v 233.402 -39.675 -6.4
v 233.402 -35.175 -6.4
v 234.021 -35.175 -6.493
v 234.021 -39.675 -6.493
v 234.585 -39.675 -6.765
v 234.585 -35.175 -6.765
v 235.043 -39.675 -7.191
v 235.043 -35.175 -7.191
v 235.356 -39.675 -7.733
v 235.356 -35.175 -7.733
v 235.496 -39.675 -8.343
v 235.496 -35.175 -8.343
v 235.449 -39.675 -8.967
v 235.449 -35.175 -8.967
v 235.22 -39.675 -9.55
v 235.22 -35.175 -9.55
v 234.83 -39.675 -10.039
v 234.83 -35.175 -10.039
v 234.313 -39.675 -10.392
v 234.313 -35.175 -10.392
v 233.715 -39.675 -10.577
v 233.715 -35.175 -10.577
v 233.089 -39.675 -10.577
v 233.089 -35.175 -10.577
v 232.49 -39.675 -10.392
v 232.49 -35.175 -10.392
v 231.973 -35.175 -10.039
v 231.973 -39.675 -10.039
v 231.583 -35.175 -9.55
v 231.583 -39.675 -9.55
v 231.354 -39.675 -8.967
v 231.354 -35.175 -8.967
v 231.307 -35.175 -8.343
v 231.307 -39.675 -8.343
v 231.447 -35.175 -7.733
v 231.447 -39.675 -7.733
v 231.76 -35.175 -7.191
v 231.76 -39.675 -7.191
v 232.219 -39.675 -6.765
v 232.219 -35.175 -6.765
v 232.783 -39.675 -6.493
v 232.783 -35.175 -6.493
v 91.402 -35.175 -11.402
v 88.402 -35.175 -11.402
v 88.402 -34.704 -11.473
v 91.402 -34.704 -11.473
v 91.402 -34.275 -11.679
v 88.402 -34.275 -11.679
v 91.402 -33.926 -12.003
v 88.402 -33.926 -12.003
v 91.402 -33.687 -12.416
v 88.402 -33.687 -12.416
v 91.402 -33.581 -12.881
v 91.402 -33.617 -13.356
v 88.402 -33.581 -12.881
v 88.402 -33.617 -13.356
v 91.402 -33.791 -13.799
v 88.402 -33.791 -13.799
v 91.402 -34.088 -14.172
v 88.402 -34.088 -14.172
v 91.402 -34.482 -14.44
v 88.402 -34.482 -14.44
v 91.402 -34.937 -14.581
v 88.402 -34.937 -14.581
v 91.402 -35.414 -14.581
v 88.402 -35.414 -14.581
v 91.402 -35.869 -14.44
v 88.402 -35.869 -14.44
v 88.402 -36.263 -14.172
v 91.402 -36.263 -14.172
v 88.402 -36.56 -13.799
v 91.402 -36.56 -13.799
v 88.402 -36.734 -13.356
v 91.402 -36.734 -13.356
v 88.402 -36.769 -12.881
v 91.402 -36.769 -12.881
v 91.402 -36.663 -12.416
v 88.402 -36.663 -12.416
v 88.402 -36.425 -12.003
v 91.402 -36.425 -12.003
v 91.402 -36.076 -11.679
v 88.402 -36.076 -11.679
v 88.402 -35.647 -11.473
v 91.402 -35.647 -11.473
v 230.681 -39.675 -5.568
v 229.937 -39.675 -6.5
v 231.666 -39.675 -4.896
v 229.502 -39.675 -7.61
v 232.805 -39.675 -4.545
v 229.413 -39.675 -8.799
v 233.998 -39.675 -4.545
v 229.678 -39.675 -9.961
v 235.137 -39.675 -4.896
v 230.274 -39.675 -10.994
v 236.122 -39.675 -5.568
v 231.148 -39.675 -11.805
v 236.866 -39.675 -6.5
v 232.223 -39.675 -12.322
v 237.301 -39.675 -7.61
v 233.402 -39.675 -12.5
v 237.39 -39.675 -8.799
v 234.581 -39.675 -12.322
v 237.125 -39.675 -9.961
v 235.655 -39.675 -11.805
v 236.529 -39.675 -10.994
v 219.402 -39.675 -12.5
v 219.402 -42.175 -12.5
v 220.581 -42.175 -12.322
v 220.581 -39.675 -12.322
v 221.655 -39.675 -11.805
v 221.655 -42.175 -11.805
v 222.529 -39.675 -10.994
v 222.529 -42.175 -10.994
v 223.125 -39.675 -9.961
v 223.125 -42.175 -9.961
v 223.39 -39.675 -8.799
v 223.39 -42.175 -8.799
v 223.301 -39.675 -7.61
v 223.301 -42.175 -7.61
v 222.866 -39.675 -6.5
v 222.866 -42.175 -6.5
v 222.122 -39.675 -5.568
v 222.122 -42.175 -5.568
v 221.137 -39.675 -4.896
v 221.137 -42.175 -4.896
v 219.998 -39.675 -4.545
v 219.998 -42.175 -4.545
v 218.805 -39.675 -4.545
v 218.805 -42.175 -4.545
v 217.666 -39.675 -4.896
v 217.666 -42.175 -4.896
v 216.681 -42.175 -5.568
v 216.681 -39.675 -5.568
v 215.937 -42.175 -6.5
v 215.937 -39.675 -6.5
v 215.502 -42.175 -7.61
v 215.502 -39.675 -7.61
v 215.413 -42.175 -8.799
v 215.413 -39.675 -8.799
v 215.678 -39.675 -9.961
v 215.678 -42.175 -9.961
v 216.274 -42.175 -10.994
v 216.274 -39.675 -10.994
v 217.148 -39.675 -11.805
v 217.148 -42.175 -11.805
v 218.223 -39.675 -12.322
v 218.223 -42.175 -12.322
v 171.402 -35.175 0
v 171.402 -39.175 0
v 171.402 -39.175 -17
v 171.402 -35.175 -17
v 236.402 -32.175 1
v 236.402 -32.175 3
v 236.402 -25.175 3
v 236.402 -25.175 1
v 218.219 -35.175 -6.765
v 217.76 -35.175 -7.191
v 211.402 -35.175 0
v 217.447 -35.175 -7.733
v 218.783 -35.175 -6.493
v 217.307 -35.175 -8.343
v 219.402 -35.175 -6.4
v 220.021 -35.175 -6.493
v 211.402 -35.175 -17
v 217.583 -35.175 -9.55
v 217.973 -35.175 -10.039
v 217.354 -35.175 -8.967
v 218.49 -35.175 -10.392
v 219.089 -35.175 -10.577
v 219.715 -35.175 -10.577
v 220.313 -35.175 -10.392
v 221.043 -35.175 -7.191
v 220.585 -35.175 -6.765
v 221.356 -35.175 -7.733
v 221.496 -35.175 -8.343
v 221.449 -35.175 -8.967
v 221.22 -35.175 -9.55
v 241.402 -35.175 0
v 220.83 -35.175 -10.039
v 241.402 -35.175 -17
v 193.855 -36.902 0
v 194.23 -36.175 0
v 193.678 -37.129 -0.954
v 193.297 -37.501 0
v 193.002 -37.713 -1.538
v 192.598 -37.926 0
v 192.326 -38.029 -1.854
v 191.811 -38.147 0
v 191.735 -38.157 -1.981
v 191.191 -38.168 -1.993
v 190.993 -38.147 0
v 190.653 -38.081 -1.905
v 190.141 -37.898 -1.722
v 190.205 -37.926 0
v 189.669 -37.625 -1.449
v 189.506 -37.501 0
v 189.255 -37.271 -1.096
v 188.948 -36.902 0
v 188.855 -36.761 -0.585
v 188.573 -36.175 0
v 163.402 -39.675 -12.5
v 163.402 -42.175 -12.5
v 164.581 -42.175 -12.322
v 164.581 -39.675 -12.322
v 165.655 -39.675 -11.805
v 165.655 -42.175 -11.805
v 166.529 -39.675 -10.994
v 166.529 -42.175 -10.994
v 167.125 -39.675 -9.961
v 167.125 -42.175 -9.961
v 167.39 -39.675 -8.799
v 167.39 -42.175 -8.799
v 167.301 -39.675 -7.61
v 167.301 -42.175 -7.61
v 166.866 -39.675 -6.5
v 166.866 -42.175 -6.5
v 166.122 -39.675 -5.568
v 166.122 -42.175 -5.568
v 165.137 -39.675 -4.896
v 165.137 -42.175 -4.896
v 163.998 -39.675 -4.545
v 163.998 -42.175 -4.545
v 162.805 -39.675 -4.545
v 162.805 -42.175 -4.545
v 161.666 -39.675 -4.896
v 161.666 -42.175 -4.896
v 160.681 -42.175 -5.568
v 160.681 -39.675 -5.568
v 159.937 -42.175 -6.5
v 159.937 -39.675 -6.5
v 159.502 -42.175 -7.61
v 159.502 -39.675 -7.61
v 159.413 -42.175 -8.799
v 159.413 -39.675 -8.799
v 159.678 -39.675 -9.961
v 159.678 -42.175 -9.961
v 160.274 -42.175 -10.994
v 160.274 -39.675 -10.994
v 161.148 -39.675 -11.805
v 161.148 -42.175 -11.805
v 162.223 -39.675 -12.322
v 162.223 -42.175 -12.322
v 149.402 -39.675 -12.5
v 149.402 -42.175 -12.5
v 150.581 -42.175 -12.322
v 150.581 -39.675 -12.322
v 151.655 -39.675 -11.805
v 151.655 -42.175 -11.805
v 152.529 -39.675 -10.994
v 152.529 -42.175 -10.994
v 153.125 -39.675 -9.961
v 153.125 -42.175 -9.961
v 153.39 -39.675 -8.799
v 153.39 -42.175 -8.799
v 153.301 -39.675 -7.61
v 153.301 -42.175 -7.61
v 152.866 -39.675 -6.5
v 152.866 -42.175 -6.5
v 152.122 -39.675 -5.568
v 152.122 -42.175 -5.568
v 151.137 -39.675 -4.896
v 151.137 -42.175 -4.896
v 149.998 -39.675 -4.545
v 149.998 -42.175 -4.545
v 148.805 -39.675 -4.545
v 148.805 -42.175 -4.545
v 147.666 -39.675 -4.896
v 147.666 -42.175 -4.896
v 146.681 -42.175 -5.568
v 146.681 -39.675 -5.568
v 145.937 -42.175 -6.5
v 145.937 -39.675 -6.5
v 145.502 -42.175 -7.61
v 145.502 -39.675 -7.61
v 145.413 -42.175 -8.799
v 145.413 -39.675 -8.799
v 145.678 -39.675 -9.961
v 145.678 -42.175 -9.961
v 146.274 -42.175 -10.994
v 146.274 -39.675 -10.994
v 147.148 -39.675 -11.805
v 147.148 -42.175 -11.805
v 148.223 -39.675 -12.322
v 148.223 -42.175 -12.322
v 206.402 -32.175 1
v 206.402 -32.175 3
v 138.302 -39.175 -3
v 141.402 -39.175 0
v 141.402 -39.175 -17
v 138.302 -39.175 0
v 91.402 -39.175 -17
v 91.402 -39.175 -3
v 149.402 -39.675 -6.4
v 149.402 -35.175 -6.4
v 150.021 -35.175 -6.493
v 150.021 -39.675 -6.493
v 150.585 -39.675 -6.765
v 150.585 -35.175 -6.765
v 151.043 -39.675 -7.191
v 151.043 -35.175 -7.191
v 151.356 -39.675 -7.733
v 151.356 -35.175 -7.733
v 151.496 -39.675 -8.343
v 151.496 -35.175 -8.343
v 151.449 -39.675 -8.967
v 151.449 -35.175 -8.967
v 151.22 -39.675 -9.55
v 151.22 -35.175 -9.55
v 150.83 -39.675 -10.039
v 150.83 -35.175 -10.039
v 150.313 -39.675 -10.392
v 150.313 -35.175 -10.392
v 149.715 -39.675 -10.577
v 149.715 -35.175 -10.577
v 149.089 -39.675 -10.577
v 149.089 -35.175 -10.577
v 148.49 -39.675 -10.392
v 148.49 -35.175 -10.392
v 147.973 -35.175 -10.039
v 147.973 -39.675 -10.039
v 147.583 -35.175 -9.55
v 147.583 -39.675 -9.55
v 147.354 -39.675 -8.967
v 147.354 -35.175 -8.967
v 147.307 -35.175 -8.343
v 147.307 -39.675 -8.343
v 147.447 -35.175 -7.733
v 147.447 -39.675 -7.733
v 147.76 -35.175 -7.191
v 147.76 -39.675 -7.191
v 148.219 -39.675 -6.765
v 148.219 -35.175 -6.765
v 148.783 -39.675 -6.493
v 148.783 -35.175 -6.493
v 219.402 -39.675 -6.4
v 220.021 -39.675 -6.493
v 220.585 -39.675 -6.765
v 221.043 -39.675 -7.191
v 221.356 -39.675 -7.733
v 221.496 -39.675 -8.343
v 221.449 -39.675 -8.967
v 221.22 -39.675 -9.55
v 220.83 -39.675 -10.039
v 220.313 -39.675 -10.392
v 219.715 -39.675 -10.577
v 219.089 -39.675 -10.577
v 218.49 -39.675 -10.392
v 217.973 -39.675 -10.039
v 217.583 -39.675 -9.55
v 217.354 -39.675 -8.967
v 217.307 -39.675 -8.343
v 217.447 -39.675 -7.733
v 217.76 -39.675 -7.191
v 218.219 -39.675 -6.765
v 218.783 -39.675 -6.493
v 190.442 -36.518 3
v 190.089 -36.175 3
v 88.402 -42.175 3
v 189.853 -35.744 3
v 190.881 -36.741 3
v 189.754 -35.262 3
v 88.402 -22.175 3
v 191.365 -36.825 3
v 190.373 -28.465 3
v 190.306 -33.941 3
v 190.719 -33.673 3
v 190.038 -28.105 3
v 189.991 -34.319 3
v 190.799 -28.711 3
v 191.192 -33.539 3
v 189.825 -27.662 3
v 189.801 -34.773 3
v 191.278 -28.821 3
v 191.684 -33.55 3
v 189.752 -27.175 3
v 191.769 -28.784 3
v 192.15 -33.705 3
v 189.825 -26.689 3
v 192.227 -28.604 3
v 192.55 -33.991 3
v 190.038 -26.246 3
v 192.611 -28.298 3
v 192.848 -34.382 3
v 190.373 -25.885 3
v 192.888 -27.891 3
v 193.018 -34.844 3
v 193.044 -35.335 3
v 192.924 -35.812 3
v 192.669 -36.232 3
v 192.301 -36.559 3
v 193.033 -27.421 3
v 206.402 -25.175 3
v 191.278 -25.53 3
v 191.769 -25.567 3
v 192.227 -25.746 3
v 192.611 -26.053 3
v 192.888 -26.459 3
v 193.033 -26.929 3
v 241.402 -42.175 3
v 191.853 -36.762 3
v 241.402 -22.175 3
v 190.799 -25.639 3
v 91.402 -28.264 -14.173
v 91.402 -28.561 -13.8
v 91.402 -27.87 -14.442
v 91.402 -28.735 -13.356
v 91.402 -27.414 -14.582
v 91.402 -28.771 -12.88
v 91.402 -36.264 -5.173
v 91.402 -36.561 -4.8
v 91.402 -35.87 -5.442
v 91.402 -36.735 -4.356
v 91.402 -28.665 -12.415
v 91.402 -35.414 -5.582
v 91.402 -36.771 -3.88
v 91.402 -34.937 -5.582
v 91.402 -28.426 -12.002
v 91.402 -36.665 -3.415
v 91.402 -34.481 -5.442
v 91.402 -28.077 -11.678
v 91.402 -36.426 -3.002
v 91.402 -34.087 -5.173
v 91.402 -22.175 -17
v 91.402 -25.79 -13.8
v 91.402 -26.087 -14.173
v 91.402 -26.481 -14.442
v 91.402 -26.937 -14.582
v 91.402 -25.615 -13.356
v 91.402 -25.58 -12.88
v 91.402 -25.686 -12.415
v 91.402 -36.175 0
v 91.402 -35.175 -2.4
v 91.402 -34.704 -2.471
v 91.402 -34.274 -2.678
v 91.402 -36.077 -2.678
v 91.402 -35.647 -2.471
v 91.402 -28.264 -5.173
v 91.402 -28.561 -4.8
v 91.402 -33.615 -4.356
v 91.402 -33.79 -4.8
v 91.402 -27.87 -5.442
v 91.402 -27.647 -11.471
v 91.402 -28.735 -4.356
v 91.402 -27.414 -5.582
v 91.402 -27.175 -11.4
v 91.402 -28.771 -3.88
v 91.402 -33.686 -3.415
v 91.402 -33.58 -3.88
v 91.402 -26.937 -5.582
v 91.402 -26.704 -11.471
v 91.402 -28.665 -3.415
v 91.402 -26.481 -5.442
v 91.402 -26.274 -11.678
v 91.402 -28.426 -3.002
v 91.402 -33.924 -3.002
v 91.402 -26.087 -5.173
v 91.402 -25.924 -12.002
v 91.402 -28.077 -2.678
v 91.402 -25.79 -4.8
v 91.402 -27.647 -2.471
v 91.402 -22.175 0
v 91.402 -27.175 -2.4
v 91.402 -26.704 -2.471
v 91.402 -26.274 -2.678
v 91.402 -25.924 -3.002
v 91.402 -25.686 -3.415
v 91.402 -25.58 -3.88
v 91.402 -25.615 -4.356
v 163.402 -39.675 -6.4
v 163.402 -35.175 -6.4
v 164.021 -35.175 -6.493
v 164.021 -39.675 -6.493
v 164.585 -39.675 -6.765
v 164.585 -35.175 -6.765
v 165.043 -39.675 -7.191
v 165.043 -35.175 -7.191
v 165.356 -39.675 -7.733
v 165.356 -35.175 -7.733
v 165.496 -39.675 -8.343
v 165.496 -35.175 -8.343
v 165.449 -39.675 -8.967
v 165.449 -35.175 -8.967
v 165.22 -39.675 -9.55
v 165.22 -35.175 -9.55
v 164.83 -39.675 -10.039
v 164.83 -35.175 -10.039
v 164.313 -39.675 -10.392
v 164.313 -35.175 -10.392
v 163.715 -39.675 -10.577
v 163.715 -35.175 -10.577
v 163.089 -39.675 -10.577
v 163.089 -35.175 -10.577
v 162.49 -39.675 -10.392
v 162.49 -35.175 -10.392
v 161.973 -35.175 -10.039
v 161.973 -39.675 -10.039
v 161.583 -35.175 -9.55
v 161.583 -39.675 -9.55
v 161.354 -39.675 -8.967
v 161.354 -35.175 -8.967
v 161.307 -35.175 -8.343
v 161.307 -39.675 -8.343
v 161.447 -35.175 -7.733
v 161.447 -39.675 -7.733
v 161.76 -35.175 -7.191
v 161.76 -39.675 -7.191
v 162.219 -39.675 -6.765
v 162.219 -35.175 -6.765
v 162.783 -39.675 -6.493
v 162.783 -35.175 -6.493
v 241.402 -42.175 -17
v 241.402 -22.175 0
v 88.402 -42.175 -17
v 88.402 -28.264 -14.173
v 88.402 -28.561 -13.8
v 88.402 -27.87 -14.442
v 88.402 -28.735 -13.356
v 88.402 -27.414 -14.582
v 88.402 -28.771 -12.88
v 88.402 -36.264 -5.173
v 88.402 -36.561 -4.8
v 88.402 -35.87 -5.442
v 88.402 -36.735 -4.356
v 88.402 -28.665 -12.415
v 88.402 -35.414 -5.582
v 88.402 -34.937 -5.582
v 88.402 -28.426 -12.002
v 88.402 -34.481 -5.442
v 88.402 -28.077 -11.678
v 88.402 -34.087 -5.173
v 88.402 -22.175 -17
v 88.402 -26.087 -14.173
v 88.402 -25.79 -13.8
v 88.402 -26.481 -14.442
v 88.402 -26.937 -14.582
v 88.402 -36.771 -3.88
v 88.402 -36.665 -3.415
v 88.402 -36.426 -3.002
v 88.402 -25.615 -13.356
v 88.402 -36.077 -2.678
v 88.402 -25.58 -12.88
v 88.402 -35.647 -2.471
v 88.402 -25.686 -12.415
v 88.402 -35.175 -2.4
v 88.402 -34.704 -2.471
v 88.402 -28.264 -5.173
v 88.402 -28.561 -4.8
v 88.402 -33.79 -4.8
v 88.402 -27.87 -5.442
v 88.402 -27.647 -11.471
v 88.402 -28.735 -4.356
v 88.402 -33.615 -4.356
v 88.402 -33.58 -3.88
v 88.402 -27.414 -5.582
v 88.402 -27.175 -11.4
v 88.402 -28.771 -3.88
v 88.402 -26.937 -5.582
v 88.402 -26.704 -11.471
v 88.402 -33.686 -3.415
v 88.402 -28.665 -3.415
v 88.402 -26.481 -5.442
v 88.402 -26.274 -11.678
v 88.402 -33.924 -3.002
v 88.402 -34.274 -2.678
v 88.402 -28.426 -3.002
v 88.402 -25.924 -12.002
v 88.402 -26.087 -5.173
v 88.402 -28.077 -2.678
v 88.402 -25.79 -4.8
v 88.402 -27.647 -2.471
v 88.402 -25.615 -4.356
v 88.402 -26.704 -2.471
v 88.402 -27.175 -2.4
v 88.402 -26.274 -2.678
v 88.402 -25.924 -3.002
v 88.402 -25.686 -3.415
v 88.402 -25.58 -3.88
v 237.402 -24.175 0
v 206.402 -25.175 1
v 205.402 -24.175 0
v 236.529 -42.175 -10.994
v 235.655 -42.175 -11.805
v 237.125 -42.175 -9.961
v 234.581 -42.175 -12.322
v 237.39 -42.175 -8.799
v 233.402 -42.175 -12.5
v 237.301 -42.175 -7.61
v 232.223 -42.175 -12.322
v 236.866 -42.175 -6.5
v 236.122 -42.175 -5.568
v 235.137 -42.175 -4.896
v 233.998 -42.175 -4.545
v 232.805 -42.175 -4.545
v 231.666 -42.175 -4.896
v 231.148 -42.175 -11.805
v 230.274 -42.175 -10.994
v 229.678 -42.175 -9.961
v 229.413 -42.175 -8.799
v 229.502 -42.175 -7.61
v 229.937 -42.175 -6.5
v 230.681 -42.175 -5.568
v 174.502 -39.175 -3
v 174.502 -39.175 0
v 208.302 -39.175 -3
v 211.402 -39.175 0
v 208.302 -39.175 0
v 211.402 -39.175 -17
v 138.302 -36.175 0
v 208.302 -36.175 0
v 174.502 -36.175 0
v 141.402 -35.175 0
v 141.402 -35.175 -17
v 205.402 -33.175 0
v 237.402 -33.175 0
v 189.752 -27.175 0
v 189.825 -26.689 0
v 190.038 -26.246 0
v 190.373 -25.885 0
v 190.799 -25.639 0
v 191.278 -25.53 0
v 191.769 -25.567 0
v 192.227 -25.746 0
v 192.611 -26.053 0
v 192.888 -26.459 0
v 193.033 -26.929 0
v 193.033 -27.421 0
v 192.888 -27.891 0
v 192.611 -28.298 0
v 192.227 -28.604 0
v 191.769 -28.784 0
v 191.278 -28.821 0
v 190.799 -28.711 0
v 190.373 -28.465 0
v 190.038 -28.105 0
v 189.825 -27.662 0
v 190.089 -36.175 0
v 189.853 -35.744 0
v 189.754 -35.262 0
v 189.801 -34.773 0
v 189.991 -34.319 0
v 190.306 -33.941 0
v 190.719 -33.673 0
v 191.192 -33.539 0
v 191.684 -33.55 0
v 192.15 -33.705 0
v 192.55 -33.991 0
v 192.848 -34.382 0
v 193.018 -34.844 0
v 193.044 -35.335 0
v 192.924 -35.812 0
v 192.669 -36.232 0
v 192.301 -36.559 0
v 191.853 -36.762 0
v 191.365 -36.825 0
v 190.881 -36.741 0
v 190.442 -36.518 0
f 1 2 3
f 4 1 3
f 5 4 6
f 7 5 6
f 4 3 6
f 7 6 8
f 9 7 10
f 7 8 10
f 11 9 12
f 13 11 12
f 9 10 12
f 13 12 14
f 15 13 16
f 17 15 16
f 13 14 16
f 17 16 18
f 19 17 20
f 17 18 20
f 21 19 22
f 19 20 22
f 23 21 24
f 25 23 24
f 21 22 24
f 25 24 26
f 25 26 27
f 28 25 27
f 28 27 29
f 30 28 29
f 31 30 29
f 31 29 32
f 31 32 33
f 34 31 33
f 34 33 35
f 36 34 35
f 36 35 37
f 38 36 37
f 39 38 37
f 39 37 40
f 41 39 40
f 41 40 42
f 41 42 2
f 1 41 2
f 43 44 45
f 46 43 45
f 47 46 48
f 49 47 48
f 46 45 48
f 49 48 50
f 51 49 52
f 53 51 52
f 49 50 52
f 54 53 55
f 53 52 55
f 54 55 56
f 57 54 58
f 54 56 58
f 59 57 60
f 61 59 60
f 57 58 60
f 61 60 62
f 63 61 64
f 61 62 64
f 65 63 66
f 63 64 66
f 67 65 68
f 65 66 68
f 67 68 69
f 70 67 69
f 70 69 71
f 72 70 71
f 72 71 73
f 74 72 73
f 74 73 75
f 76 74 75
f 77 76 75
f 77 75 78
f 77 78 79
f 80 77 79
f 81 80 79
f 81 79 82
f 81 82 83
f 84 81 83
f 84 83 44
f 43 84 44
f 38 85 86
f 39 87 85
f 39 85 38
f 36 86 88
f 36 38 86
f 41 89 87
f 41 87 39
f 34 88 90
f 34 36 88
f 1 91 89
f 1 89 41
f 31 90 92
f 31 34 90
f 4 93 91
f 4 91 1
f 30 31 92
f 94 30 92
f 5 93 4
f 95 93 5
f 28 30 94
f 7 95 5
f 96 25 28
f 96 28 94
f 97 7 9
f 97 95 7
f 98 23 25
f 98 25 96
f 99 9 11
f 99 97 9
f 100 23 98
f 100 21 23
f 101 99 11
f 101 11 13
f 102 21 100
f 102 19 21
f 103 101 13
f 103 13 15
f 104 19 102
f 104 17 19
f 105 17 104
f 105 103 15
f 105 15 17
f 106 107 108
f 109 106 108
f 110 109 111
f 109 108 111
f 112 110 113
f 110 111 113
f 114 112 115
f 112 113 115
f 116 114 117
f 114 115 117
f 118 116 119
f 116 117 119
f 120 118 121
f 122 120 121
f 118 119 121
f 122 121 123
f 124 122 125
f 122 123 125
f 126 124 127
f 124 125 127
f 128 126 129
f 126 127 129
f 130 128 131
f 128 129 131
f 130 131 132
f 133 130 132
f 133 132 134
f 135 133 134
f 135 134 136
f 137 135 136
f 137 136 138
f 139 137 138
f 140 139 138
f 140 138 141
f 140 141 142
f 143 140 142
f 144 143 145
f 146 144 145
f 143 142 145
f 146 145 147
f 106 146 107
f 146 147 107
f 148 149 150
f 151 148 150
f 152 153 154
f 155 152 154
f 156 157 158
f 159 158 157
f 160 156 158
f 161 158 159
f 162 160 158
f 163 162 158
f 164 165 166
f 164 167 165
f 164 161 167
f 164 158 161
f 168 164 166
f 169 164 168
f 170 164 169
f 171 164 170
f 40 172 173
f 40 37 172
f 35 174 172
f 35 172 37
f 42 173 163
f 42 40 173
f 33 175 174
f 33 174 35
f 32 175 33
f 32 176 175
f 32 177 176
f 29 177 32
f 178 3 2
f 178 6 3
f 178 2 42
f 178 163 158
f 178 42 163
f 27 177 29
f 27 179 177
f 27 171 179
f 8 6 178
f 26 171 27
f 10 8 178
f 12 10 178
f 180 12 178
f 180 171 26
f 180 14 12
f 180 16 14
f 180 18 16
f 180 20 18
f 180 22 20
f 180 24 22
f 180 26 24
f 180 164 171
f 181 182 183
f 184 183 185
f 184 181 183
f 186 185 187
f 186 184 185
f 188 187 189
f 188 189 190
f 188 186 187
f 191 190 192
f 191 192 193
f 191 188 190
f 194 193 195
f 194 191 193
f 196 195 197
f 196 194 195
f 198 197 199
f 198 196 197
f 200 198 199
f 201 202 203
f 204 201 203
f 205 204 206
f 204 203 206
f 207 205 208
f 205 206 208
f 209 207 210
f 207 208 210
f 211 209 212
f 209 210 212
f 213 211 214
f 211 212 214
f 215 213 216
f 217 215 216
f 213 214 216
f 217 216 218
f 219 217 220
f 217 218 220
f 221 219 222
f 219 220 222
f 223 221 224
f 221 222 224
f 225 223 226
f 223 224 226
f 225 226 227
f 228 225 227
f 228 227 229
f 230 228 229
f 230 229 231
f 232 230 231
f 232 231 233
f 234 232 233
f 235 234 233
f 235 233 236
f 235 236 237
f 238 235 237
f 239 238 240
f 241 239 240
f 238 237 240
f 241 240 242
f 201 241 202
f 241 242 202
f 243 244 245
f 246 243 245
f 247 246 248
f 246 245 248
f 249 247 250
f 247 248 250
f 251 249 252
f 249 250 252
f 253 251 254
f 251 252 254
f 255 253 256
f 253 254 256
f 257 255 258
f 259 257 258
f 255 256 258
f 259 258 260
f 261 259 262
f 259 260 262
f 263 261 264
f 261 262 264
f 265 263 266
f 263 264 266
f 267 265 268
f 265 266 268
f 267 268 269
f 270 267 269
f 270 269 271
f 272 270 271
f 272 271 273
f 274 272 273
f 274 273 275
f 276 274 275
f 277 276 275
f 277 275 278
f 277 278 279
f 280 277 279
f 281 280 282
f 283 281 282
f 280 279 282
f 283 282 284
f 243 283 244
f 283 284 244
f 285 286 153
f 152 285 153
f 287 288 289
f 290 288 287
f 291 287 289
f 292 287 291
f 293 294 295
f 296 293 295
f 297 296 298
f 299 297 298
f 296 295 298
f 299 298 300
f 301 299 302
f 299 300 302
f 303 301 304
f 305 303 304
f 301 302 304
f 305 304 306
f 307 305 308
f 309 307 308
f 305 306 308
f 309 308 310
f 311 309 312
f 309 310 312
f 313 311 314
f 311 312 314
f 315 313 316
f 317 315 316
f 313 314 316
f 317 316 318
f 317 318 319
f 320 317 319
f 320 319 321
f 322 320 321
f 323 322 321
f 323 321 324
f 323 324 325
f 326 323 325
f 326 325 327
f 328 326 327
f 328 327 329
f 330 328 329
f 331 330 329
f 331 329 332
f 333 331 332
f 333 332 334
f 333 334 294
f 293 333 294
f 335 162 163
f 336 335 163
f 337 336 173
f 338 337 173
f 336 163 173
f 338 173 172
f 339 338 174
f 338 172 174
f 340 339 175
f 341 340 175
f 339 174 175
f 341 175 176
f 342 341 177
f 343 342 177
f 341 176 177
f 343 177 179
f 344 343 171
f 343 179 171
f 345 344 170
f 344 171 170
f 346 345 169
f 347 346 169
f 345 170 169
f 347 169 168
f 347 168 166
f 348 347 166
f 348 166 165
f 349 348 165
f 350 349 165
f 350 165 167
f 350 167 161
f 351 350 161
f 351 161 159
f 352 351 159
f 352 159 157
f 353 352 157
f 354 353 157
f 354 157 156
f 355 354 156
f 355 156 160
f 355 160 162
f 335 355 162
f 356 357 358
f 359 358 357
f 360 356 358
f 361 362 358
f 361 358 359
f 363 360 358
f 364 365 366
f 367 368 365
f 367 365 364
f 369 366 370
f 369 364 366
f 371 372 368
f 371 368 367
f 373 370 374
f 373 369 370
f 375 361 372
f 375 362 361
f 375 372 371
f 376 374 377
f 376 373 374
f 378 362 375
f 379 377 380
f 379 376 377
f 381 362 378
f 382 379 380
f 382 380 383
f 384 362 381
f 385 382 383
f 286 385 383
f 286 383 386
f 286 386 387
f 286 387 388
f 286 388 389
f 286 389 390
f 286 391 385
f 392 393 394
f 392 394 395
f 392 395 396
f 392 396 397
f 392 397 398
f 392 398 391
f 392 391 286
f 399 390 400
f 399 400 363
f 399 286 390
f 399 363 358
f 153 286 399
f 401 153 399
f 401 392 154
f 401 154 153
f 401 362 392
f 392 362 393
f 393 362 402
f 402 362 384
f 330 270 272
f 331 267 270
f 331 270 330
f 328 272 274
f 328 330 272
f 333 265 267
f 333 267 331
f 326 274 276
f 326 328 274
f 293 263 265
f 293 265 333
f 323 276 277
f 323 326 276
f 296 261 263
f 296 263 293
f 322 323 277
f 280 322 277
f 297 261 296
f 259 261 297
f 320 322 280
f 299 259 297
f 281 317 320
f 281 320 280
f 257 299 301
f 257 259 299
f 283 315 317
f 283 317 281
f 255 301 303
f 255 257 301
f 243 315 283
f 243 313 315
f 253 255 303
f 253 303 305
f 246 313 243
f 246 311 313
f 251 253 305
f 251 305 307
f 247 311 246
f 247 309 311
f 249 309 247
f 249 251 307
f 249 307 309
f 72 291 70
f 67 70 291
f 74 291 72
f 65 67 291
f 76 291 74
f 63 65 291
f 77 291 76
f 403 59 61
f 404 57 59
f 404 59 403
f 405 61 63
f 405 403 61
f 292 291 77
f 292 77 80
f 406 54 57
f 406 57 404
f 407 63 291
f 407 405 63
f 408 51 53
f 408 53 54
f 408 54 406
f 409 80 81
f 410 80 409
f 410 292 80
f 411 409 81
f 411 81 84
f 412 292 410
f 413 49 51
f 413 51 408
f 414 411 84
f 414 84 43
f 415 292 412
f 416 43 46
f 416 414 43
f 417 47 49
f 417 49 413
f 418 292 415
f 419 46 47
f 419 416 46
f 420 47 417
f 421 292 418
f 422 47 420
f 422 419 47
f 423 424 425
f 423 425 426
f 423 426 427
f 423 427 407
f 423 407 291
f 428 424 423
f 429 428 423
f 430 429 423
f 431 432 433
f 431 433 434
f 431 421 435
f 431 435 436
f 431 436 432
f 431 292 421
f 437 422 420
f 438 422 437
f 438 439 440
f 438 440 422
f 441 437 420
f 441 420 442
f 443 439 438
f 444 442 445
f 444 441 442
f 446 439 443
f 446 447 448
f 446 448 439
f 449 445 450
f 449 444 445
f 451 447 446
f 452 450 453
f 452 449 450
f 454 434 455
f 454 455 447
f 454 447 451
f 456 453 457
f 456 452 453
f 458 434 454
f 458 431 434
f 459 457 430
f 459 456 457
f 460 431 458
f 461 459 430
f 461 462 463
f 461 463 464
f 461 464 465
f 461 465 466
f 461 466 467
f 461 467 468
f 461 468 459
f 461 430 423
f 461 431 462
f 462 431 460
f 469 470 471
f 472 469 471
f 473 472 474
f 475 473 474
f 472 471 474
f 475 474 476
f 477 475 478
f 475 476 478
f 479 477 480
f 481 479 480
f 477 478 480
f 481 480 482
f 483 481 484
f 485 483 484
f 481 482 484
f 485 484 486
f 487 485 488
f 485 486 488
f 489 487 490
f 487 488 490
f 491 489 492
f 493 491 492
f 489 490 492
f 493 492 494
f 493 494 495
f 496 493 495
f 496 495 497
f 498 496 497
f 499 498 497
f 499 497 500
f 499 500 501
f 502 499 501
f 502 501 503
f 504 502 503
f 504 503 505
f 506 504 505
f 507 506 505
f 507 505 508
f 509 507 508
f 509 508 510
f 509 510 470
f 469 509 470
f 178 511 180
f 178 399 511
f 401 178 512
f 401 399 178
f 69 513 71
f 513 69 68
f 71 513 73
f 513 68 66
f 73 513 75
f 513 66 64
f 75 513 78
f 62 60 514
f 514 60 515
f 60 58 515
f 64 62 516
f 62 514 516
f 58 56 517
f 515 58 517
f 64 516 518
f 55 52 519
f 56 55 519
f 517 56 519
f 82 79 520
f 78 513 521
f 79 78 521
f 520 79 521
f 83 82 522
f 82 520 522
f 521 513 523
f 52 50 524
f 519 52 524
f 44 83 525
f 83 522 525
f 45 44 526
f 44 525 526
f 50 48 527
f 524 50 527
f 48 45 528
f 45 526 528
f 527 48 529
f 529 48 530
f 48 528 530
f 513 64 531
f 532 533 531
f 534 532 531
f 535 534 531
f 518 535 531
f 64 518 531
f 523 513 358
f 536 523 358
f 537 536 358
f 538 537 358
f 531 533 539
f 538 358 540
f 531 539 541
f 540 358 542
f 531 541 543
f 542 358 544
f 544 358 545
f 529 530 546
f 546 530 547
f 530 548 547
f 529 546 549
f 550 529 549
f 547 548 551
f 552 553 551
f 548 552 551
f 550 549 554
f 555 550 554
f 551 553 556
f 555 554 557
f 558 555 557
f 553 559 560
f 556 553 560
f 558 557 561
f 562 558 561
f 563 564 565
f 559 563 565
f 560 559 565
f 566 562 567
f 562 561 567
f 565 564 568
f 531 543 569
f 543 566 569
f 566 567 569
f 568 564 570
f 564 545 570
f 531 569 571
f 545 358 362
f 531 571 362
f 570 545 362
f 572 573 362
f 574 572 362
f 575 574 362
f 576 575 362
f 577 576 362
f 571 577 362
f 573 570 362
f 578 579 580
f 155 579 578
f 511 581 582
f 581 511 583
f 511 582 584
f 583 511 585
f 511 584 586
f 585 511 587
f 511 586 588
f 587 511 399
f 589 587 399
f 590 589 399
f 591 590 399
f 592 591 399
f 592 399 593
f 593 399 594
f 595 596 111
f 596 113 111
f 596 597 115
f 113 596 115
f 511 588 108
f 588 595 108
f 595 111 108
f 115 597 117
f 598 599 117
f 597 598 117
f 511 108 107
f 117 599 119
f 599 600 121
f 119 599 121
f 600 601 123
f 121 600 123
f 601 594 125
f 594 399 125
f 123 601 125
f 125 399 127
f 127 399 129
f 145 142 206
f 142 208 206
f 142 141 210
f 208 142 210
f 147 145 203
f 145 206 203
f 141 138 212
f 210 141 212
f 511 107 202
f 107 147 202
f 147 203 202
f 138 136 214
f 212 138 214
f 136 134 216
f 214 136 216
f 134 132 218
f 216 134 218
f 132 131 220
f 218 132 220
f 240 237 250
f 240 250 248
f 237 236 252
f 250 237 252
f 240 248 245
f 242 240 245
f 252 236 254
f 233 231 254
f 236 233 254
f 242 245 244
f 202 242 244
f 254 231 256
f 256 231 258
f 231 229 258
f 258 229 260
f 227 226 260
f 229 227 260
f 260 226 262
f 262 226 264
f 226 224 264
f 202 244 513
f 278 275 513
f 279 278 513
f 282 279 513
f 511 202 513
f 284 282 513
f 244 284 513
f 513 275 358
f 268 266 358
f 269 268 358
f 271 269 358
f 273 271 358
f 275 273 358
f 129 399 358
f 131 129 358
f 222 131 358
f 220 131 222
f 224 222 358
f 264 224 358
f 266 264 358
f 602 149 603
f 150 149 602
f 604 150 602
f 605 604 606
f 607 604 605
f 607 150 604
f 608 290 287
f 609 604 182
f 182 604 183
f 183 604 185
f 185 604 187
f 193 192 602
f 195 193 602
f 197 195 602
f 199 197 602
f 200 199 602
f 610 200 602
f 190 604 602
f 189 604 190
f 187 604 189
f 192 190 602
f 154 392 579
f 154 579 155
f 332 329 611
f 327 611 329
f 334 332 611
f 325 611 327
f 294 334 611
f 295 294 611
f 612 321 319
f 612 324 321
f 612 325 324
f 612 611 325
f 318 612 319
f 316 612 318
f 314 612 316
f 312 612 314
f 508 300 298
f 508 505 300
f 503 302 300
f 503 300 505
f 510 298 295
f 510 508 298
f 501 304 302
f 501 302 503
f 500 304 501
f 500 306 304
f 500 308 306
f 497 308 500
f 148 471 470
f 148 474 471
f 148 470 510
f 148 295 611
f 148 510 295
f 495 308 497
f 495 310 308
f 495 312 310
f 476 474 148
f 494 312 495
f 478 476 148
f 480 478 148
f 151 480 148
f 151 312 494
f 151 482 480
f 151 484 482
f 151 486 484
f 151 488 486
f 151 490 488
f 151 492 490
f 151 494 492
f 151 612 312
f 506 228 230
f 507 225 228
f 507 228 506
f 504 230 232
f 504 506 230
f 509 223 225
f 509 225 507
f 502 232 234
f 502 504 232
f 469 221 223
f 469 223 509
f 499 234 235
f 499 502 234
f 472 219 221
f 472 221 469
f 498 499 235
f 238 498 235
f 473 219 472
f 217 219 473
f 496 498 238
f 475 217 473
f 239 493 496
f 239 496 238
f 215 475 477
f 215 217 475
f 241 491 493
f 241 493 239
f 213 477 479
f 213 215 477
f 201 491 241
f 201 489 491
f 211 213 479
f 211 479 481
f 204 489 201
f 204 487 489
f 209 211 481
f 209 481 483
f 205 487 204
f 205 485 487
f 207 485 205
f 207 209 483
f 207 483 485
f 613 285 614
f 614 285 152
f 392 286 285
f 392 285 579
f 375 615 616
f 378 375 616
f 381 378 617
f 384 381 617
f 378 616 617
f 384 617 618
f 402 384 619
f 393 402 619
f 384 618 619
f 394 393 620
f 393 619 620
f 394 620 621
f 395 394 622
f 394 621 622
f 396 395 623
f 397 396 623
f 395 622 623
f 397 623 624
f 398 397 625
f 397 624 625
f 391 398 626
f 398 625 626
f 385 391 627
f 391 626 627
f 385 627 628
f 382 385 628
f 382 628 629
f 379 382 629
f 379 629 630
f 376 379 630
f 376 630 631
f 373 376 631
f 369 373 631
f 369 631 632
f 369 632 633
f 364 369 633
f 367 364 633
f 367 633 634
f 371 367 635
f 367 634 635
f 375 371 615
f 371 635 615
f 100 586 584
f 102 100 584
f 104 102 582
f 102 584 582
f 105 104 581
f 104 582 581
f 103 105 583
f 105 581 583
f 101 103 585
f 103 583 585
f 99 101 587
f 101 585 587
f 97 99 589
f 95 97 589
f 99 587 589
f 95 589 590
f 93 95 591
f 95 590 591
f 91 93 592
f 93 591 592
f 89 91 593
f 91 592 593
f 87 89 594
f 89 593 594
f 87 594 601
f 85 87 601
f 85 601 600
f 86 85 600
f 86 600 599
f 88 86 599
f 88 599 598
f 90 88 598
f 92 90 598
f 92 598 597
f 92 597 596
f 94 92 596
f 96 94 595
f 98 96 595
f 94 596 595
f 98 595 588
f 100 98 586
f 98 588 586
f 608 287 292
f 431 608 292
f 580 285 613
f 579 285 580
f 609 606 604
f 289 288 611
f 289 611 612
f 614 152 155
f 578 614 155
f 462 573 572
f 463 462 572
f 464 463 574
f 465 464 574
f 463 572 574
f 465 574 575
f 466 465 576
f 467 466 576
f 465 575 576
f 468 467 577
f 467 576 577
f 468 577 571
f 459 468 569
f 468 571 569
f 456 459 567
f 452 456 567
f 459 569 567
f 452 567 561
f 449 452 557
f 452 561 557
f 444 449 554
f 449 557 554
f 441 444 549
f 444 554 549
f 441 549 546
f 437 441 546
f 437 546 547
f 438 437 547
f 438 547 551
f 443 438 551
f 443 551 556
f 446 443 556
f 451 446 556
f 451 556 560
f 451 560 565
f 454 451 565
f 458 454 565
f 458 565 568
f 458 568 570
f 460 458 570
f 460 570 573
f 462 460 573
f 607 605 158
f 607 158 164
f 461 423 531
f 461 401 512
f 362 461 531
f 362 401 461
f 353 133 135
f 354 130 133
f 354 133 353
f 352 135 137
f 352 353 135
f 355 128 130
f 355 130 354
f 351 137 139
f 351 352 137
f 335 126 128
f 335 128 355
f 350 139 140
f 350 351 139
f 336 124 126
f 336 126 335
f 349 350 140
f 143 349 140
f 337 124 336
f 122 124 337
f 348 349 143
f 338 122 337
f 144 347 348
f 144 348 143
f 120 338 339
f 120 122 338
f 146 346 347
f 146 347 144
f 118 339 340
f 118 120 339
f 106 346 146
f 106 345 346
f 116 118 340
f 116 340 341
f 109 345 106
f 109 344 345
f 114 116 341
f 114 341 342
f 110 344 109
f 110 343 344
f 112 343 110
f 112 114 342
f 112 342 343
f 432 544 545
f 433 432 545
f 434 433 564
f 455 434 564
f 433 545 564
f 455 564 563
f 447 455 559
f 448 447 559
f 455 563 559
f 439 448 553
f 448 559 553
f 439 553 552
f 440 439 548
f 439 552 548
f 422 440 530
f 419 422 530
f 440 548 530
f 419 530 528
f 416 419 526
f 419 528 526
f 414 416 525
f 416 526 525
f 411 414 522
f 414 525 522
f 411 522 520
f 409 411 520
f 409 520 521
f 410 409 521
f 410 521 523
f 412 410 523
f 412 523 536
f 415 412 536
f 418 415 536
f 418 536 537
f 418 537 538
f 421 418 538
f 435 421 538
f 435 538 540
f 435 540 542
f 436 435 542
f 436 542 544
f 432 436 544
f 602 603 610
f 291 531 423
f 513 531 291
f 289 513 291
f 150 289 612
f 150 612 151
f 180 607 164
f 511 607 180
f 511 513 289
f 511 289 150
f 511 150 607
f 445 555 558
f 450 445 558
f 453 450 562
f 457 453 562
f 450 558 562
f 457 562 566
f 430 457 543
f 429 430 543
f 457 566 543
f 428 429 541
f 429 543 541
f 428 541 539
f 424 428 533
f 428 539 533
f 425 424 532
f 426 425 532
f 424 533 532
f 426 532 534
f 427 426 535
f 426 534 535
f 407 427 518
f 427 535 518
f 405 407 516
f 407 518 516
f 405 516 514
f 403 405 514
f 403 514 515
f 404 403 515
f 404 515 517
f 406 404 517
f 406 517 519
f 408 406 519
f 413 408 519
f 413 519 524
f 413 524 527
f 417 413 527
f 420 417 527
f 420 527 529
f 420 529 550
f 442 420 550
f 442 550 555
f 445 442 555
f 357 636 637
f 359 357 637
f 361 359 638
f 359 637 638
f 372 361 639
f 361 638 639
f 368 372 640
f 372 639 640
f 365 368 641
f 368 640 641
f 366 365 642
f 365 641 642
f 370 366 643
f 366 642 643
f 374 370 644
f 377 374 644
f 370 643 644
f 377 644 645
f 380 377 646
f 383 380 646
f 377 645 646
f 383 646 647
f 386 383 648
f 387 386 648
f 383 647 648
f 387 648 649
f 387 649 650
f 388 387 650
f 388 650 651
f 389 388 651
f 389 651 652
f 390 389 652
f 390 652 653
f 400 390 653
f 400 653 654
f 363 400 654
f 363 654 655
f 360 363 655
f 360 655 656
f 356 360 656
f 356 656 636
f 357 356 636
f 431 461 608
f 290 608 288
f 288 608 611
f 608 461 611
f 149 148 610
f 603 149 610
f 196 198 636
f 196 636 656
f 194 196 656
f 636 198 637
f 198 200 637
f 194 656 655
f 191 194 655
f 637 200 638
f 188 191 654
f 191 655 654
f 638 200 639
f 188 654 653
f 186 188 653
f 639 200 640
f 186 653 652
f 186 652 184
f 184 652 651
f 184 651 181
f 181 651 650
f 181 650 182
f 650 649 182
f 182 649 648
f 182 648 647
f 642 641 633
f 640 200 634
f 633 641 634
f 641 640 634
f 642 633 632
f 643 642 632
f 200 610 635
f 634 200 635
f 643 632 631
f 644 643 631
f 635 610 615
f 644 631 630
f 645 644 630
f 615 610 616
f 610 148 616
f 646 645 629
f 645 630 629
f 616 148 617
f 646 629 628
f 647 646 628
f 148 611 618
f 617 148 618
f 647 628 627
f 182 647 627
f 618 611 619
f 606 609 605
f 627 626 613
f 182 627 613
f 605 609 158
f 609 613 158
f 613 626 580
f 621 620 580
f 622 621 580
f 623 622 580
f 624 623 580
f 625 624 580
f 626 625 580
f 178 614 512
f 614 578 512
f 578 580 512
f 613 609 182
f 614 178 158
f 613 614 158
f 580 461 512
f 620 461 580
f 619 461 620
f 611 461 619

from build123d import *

# Parameters (mm, degrees)
SKETCH1_W           = 153
SKETCH1_H           = 20
BOSS_EXTRUDE1_DEPTH = 3
SKETCH2_W           = 3
SKETCH2_H           = 20
BOSS_EXTRUDE2_DEPTH = 17
SKETCH3_W           = 150
SKETCH3_H           = 3
BOSS_EXTRUDE3_DEPTH = 17
SKETCH4_R           = 1.6
SKETCH4_R_2         = 1.598435099
CUT_EXTRUDE1_DEPTH  = 10
SKETCH6_W           = 30
SKETCH6_H           = 17
BOSS_EXTRUDE4_DEPTH = 4
SKETCH7_R           = 2.1
CUT_EXTRUDE3_DEPTH  = 243.348358538
SKETCH8_R           = 4
CUT_EXTRUDE4_DEPTH  = 2.5
SKETCH9_W           = 30
SKETCH9_H           = 17
BOSS_EXTRUDE5_DEPTH = 4
SKETCH12_R          = 2.1
CUT_EXTRUDE7_DEPTH  = 243.348358538
SKETCH13_R          = 4
CUT_EXTRUDE8_DEPTH  = 2.5
SKETCH14_W          = 30
SKETCH14_H          = 7
CUT_EXTRUDE9_DEPTH  = 3
CHAMFER8_SIZE       = 1
CHAMFER9_SIZE       = 3
SKETCH15_W          = 3.1
SKETCH15_H          = 17
CUT_EXTRUDE10_DEPTH = 3
SKETCH16_R          = 1.65
CUT_EXTRUDE11_DEPTH = 3
SKETCH17_R          = 3
CUT_EXTRUDE12_DEPTH = 6


with BuildPart() as part:
    # Sketch1 → Boss-Extrude1 (new body)
    with BuildSketch(Plane.XY):
        with Locations((164.901588409, -32.175360178)):
            Rectangle(SKETCH1_W, SKETCH1_H)
    extrude(amount=BOSS_EXTRUDE1_DEPTH)

    # Sketch2 → Boss-Extrude2 (add)
    with BuildSketch(Plane(origin=(0, 0, 0), x_dir=(-1, 0, 0), z_dir=(0, 0, -1))):
        with Locations((-89.901588409, -32.175360178)):
            Rectangle(SKETCH2_W, SKETCH2_H)
    extrude(amount=BOSS_EXTRUDE2_DEPTH)

    # Sketch3 → Boss-Extrude3 (add)
    with BuildSketch(Plane(origin=(0, 0, 0), x_dir=(-1, 0, 0), z_dir=(0, 0, -1))):
        with Locations((-166.401588409, -40.675360178)):
            Rectangle(SKETCH3_W, SKETCH3_H)
    extrude(amount=BOSS_EXTRUDE3_DEPTH)

    # Sketch4 → Cut-Extrude1 (cut)
    with BuildSketch(Plane.ZY.offset(-88.401588409)):
        with Locations((-13, -27.175360178)):
            Circle(SKETCH4_R)
        with Locations((-4, -27.175360178)):
            Circle(SKETCH4_R)
        with Locations((-4, -35.175360178)):
            Circle(SKETCH4_R)
        with Locations((-13, -35.175360178)):
            Circle(SKETCH4_R_2)
    extrude(amount=-CUT_EXTRUDE1_DEPTH, mode=Mode.SUBTRACT)

    # Sketch6 → Boss-Extrude4 (add)
    with BuildSketch(Plane(origin=(0, -39.175360178, 0), x_dir=(1, 0, 0), z_dir=(0, 1, 0))):
        with Locations((226.401588409, 8.5)):
            Rectangle(SKETCH6_W, SKETCH6_H)
    extrude(amount=BOSS_EXTRUDE4_DEPTH)

    # Sketch7 → Cut-Extrude3 (cut, through all)
    with BuildSketch(Plane(origin=(0, -35.175360178, 0), x_dir=(1, 0, 0), z_dir=(0, 1, 0))):
        with Locations(Location((219.401588409, 8.5, 0), (0, 0, 270))):
            Circle(SKETCH7_R)
        with Locations(Location((233.401588409, 8.5, 0), (0, 0, 270))):
            Circle(SKETCH7_R)
    extrude(amount=-CUT_EXTRUDE3_DEPTH, mode=Mode.SUBTRACT)

    # Sketch8 → Cut-Extrude4 (cut)
    with BuildSketch(Plane.XZ.offset(42.175360178)):
        with Locations(Location((219.401588409, -8.5, 0), (0, 0, 270))):
            Circle(SKETCH8_R)
        with Locations(Location((233.401588409, -8.5, 0), (0, 0, 270))):
            Circle(SKETCH8_R)
    extrude(amount=-CUT_EXTRUDE4_DEPTH, mode=Mode.SUBTRACT)

    # Sketch9 → Boss-Extrude5 (add)
    with BuildSketch(Plane(origin=(0, -39.175360178, 0), x_dir=(1, 0, 0), z_dir=(0, 1, 0))):
        with Locations((156.401588409, 8.5)):
            Rectangle(SKETCH9_W, SKETCH9_H)
    extrude(amount=BOSS_EXTRUDE5_DEPTH)

    # Sketch12 → Cut-Extrude7 (cut, through all)
    with BuildSketch(Plane(origin=(0, -35.175360178, 0), x_dir=(1, 0, 0), z_dir=(0, 1, 0))):
        with Locations(Location((163.401588409, 8.5, 0), (0, 0, 270))):
            Circle(SKETCH12_R)
        with Locations(Location((149.401588409, 8.5, 0), (0, 0, 270))):
            Circle(SKETCH12_R)
    extrude(amount=-CUT_EXTRUDE7_DEPTH, mode=Mode.SUBTRACT)

    # Sketch13 → Cut-Extrude8 (cut)
    with BuildSketch(Plane.XZ.offset(42.175360178)):
        with Locations(Location((163.401588409, -8.5, 0), (0, 0, 270))):
            Circle(SKETCH13_R)
        with Locations(Location((149.401588409, -8.5, 0), (0, 0, 270))):
            Circle(SKETCH13_R)
    extrude(amount=-CUT_EXTRUDE8_DEPTH, mode=Mode.SUBTRACT)

    # Sketch14 → Cut-Extrude9 (cut)
    with BuildSketch(Plane.XY.offset(3)):
        with Locations((221.401588409, -28.675360178)):
            Rectangle(SKETCH14_W, SKETCH14_H)
    extrude(amount=-CUT_EXTRUDE9_DEPTH, mode=Mode.SUBTRACT)

    # Chamfer8
    chamfer8_edges = [part.edges().sort_by_distance(p)[0] for p in [
        (236.401588409, -28.675360178, 0),
        (221.401588409, -32.175360178, 0),
        (206.401588409, -28.675360178, 0),
        (221.401588409, -25.175360178, 0),
    ]]
    chamfer(chamfer8_edges, length=CHAMFER8_SIZE)

    # Chamfer9
    chamfer9_edges = [part.edges().sort_by_distance(p)[0] for p in [
        (116.401588409, -39.175360178, 0),
        (191.401588409, -39.175360178, 0),
    ]]
    chamfer(chamfer9_edges, length=CHAMFER9_SIZE)

    # Sketch15 → Cut-Extrude10 (cut)
    with BuildSketch(Plane(origin=(0, -39.175360178, 0), x_dir=(1, 0, 0), z_dir=(0, 1, 0))):
        with Locations((209.851588409, 8.5)):
            Rectangle(SKETCH15_W, SKETCH15_H)
        with Locations((172.951588409, 8.5)):
            Rectangle(SKETCH15_W, SKETCH15_H)
        with Locations((139.851588409, 8.5)):
            Rectangle(SKETCH15_W, SKETCH15_H)
    extrude(amount=CUT_EXTRUDE10_DEPTH, mode=Mode.SUBTRACT)

    # Sketch16 → Cut-Extrude11 (cut)
    with BuildSketch(Plane(origin=(0, 0, 0), x_dir=(-1, 0, 0), z_dir=(0, 0, -1))):
        with Locations((-191.401588409, -27.175360178)):
            Circle(SKETCH16_R)
        with Locations(Location((-191.401588409, -35.175360178, 0), (0, 0, 322.694799034))):
            Circle(SKETCH16_R)
    extrude(amount=-CUT_EXTRUDE11_DEPTH, mode=Mode.SUBTRACT)

    # Sketch17 → Cut-Extrude12 (cut)
    with BuildSketch(Plane(origin=(0, 0, 0), x_dir=(-1, 0, 0), z_dir=(0, 0, -1))):
        with Locations((-191.401588409, -35.175360178)):
            Circle(SKETCH17_R)
    extrude(amount=CUT_EXTRUDE12_DEPTH, mode=Mode.SUBTRACT)


solid = part.part
